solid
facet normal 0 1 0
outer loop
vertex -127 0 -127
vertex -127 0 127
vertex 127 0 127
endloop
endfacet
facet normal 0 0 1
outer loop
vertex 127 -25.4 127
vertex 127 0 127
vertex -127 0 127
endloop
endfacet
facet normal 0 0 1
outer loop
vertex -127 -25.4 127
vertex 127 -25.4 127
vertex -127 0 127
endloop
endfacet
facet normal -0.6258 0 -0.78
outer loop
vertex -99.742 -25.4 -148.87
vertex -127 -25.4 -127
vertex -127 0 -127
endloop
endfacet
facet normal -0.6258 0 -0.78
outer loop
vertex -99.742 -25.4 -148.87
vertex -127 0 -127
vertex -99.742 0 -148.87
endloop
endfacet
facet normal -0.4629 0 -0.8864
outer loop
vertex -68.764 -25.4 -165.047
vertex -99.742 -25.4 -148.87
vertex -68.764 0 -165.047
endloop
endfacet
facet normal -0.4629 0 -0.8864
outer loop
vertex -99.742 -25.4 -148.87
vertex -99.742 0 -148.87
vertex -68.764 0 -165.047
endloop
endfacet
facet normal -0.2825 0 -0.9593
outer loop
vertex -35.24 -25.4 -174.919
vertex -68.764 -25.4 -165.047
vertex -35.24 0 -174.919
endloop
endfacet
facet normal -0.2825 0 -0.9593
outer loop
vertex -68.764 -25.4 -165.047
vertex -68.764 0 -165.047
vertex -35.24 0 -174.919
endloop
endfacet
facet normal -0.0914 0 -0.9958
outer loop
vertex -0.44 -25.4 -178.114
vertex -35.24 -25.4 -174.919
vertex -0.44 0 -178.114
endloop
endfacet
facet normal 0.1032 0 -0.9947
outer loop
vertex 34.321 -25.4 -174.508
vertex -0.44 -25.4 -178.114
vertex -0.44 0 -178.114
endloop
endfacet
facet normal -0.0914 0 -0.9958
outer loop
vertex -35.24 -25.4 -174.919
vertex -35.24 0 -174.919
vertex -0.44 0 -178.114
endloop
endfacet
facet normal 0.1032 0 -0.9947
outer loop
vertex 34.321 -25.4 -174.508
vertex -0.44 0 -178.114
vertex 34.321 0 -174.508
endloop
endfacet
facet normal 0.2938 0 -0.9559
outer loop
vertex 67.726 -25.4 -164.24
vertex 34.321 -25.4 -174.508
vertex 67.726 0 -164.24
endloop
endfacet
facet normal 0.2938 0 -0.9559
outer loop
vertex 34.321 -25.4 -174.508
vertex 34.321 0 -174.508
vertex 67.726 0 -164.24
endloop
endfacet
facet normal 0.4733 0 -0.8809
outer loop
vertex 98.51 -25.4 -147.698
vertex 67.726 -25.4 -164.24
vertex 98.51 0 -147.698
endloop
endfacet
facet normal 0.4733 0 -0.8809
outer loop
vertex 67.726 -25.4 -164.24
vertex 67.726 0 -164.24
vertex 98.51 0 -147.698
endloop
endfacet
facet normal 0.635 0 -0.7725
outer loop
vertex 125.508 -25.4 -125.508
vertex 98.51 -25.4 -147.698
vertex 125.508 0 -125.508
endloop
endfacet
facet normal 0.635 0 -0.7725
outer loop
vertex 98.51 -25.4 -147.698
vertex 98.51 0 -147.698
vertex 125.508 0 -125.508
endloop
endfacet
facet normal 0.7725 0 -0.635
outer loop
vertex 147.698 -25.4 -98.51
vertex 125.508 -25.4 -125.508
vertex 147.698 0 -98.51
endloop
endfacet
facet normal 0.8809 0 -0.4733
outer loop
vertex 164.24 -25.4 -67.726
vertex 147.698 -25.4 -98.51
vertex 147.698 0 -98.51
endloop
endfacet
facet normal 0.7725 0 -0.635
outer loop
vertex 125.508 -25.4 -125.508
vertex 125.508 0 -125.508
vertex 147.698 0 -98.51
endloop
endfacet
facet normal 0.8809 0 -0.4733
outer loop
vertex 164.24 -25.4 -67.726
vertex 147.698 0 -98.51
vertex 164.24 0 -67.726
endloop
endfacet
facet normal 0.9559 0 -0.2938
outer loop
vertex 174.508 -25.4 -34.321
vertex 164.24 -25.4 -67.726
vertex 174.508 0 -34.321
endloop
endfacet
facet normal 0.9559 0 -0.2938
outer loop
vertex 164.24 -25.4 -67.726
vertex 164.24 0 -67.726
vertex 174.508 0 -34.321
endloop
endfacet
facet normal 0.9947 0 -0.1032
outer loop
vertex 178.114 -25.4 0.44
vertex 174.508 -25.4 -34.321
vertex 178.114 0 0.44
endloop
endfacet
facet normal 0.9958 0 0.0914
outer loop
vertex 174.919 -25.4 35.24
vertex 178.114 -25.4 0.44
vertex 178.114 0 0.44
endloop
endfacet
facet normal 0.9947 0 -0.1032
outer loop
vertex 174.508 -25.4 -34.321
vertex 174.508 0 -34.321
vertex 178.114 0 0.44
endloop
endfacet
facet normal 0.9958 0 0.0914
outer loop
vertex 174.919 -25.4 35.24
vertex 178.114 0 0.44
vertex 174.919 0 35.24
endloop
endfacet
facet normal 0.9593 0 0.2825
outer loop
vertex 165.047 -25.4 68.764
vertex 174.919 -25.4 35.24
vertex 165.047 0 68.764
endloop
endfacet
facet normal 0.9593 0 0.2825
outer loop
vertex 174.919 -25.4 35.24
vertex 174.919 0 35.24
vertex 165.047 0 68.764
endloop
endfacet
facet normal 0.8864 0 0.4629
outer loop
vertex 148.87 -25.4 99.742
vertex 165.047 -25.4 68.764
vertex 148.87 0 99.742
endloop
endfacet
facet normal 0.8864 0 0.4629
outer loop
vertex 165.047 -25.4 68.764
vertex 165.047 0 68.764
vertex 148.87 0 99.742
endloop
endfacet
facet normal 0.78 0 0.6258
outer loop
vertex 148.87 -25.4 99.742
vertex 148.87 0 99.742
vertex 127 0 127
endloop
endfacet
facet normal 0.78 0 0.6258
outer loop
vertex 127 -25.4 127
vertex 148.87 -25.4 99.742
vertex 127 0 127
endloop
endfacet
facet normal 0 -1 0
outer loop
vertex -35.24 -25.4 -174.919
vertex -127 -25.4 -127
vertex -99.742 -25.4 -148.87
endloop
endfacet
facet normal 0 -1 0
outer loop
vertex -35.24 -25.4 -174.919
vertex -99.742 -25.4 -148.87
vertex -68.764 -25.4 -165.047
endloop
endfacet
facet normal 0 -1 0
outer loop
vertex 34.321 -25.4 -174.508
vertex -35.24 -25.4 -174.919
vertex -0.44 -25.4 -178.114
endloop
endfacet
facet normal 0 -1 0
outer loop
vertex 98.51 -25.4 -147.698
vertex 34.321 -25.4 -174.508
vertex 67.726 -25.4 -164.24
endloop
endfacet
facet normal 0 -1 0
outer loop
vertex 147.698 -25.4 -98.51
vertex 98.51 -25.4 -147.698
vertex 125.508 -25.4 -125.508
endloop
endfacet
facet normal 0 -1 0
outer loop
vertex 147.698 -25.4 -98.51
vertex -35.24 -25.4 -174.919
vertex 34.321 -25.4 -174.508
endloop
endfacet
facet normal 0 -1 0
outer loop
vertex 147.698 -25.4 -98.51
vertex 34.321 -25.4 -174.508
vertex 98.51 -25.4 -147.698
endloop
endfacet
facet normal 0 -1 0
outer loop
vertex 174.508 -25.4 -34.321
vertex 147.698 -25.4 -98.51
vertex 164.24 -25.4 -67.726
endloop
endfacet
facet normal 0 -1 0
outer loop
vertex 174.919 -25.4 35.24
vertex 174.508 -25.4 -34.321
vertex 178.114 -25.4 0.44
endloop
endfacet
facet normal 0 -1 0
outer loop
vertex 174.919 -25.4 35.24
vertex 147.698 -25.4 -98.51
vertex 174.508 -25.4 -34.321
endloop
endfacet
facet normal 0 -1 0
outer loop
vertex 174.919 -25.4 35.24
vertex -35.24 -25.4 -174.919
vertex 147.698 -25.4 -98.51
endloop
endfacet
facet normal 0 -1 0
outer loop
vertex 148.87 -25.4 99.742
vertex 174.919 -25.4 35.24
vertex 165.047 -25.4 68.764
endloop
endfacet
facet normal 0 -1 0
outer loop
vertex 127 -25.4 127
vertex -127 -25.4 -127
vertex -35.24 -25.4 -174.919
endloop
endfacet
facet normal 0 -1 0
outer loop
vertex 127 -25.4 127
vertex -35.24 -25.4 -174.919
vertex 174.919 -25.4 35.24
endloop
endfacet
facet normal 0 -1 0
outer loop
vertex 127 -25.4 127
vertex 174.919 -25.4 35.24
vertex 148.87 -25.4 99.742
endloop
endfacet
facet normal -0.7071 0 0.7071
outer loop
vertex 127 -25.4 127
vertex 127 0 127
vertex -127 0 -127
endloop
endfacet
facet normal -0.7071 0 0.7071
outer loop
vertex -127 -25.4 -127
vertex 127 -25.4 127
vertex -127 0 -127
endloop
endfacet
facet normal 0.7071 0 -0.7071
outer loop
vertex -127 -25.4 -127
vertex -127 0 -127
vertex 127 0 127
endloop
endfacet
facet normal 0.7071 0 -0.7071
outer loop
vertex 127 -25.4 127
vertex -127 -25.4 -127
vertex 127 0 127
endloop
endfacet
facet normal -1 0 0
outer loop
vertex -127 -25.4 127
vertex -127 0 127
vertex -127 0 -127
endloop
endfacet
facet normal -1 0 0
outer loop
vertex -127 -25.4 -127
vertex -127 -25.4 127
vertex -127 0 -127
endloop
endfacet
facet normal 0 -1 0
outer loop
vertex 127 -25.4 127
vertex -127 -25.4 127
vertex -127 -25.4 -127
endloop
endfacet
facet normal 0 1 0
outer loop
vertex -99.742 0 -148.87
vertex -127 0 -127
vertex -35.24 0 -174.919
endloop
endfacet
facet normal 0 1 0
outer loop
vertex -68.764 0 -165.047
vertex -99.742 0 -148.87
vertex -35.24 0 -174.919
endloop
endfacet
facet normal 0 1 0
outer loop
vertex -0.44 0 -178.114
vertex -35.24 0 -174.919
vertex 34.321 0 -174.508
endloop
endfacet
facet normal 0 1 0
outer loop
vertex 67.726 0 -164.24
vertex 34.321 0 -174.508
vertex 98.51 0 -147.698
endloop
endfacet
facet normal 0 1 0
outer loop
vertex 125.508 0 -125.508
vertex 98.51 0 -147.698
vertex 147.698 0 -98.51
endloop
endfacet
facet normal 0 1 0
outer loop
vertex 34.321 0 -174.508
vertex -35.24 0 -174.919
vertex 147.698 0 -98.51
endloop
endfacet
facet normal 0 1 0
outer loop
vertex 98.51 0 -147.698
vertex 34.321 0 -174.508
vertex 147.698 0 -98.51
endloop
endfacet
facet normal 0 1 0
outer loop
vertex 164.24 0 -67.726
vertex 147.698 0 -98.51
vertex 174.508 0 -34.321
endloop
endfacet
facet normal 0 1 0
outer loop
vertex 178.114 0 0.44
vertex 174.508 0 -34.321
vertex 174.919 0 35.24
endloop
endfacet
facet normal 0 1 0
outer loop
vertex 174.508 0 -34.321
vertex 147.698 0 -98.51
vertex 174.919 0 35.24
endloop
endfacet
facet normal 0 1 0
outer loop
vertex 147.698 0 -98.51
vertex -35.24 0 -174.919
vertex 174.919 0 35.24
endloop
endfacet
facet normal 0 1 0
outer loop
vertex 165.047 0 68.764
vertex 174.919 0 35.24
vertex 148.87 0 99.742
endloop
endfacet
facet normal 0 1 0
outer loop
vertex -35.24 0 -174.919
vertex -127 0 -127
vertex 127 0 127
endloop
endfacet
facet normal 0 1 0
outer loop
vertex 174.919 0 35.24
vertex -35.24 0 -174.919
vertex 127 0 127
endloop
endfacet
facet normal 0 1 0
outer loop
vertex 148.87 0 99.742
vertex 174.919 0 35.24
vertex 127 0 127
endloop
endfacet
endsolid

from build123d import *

# Parameters (mm, degrees)
F1_DEPTH = 25.4
F2_DEPTH = 25.4


with BuildPart() as f1:
    # F0 (on Front) → F1 (new body)
    with BuildSketch(Plane.XZ):
        Polygon((127, 127), (-127, 127), (-127, -127), align=None)
    extrude(amount=F1_DEPTH)


with BuildPart() as f2:
    # F0 (on Front) → F2 (new body)
    with BuildSketch(Plane.XZ):
        with BuildLine():
            ThreePointArc((-127, -127), (125.507922, -125.507922), (127, 127))
            Line((127, 127), (-127, -127))
        make_face()
    extrude(amount=F2_DEPTH)


solid = Compound([f1.part, f2.part])
